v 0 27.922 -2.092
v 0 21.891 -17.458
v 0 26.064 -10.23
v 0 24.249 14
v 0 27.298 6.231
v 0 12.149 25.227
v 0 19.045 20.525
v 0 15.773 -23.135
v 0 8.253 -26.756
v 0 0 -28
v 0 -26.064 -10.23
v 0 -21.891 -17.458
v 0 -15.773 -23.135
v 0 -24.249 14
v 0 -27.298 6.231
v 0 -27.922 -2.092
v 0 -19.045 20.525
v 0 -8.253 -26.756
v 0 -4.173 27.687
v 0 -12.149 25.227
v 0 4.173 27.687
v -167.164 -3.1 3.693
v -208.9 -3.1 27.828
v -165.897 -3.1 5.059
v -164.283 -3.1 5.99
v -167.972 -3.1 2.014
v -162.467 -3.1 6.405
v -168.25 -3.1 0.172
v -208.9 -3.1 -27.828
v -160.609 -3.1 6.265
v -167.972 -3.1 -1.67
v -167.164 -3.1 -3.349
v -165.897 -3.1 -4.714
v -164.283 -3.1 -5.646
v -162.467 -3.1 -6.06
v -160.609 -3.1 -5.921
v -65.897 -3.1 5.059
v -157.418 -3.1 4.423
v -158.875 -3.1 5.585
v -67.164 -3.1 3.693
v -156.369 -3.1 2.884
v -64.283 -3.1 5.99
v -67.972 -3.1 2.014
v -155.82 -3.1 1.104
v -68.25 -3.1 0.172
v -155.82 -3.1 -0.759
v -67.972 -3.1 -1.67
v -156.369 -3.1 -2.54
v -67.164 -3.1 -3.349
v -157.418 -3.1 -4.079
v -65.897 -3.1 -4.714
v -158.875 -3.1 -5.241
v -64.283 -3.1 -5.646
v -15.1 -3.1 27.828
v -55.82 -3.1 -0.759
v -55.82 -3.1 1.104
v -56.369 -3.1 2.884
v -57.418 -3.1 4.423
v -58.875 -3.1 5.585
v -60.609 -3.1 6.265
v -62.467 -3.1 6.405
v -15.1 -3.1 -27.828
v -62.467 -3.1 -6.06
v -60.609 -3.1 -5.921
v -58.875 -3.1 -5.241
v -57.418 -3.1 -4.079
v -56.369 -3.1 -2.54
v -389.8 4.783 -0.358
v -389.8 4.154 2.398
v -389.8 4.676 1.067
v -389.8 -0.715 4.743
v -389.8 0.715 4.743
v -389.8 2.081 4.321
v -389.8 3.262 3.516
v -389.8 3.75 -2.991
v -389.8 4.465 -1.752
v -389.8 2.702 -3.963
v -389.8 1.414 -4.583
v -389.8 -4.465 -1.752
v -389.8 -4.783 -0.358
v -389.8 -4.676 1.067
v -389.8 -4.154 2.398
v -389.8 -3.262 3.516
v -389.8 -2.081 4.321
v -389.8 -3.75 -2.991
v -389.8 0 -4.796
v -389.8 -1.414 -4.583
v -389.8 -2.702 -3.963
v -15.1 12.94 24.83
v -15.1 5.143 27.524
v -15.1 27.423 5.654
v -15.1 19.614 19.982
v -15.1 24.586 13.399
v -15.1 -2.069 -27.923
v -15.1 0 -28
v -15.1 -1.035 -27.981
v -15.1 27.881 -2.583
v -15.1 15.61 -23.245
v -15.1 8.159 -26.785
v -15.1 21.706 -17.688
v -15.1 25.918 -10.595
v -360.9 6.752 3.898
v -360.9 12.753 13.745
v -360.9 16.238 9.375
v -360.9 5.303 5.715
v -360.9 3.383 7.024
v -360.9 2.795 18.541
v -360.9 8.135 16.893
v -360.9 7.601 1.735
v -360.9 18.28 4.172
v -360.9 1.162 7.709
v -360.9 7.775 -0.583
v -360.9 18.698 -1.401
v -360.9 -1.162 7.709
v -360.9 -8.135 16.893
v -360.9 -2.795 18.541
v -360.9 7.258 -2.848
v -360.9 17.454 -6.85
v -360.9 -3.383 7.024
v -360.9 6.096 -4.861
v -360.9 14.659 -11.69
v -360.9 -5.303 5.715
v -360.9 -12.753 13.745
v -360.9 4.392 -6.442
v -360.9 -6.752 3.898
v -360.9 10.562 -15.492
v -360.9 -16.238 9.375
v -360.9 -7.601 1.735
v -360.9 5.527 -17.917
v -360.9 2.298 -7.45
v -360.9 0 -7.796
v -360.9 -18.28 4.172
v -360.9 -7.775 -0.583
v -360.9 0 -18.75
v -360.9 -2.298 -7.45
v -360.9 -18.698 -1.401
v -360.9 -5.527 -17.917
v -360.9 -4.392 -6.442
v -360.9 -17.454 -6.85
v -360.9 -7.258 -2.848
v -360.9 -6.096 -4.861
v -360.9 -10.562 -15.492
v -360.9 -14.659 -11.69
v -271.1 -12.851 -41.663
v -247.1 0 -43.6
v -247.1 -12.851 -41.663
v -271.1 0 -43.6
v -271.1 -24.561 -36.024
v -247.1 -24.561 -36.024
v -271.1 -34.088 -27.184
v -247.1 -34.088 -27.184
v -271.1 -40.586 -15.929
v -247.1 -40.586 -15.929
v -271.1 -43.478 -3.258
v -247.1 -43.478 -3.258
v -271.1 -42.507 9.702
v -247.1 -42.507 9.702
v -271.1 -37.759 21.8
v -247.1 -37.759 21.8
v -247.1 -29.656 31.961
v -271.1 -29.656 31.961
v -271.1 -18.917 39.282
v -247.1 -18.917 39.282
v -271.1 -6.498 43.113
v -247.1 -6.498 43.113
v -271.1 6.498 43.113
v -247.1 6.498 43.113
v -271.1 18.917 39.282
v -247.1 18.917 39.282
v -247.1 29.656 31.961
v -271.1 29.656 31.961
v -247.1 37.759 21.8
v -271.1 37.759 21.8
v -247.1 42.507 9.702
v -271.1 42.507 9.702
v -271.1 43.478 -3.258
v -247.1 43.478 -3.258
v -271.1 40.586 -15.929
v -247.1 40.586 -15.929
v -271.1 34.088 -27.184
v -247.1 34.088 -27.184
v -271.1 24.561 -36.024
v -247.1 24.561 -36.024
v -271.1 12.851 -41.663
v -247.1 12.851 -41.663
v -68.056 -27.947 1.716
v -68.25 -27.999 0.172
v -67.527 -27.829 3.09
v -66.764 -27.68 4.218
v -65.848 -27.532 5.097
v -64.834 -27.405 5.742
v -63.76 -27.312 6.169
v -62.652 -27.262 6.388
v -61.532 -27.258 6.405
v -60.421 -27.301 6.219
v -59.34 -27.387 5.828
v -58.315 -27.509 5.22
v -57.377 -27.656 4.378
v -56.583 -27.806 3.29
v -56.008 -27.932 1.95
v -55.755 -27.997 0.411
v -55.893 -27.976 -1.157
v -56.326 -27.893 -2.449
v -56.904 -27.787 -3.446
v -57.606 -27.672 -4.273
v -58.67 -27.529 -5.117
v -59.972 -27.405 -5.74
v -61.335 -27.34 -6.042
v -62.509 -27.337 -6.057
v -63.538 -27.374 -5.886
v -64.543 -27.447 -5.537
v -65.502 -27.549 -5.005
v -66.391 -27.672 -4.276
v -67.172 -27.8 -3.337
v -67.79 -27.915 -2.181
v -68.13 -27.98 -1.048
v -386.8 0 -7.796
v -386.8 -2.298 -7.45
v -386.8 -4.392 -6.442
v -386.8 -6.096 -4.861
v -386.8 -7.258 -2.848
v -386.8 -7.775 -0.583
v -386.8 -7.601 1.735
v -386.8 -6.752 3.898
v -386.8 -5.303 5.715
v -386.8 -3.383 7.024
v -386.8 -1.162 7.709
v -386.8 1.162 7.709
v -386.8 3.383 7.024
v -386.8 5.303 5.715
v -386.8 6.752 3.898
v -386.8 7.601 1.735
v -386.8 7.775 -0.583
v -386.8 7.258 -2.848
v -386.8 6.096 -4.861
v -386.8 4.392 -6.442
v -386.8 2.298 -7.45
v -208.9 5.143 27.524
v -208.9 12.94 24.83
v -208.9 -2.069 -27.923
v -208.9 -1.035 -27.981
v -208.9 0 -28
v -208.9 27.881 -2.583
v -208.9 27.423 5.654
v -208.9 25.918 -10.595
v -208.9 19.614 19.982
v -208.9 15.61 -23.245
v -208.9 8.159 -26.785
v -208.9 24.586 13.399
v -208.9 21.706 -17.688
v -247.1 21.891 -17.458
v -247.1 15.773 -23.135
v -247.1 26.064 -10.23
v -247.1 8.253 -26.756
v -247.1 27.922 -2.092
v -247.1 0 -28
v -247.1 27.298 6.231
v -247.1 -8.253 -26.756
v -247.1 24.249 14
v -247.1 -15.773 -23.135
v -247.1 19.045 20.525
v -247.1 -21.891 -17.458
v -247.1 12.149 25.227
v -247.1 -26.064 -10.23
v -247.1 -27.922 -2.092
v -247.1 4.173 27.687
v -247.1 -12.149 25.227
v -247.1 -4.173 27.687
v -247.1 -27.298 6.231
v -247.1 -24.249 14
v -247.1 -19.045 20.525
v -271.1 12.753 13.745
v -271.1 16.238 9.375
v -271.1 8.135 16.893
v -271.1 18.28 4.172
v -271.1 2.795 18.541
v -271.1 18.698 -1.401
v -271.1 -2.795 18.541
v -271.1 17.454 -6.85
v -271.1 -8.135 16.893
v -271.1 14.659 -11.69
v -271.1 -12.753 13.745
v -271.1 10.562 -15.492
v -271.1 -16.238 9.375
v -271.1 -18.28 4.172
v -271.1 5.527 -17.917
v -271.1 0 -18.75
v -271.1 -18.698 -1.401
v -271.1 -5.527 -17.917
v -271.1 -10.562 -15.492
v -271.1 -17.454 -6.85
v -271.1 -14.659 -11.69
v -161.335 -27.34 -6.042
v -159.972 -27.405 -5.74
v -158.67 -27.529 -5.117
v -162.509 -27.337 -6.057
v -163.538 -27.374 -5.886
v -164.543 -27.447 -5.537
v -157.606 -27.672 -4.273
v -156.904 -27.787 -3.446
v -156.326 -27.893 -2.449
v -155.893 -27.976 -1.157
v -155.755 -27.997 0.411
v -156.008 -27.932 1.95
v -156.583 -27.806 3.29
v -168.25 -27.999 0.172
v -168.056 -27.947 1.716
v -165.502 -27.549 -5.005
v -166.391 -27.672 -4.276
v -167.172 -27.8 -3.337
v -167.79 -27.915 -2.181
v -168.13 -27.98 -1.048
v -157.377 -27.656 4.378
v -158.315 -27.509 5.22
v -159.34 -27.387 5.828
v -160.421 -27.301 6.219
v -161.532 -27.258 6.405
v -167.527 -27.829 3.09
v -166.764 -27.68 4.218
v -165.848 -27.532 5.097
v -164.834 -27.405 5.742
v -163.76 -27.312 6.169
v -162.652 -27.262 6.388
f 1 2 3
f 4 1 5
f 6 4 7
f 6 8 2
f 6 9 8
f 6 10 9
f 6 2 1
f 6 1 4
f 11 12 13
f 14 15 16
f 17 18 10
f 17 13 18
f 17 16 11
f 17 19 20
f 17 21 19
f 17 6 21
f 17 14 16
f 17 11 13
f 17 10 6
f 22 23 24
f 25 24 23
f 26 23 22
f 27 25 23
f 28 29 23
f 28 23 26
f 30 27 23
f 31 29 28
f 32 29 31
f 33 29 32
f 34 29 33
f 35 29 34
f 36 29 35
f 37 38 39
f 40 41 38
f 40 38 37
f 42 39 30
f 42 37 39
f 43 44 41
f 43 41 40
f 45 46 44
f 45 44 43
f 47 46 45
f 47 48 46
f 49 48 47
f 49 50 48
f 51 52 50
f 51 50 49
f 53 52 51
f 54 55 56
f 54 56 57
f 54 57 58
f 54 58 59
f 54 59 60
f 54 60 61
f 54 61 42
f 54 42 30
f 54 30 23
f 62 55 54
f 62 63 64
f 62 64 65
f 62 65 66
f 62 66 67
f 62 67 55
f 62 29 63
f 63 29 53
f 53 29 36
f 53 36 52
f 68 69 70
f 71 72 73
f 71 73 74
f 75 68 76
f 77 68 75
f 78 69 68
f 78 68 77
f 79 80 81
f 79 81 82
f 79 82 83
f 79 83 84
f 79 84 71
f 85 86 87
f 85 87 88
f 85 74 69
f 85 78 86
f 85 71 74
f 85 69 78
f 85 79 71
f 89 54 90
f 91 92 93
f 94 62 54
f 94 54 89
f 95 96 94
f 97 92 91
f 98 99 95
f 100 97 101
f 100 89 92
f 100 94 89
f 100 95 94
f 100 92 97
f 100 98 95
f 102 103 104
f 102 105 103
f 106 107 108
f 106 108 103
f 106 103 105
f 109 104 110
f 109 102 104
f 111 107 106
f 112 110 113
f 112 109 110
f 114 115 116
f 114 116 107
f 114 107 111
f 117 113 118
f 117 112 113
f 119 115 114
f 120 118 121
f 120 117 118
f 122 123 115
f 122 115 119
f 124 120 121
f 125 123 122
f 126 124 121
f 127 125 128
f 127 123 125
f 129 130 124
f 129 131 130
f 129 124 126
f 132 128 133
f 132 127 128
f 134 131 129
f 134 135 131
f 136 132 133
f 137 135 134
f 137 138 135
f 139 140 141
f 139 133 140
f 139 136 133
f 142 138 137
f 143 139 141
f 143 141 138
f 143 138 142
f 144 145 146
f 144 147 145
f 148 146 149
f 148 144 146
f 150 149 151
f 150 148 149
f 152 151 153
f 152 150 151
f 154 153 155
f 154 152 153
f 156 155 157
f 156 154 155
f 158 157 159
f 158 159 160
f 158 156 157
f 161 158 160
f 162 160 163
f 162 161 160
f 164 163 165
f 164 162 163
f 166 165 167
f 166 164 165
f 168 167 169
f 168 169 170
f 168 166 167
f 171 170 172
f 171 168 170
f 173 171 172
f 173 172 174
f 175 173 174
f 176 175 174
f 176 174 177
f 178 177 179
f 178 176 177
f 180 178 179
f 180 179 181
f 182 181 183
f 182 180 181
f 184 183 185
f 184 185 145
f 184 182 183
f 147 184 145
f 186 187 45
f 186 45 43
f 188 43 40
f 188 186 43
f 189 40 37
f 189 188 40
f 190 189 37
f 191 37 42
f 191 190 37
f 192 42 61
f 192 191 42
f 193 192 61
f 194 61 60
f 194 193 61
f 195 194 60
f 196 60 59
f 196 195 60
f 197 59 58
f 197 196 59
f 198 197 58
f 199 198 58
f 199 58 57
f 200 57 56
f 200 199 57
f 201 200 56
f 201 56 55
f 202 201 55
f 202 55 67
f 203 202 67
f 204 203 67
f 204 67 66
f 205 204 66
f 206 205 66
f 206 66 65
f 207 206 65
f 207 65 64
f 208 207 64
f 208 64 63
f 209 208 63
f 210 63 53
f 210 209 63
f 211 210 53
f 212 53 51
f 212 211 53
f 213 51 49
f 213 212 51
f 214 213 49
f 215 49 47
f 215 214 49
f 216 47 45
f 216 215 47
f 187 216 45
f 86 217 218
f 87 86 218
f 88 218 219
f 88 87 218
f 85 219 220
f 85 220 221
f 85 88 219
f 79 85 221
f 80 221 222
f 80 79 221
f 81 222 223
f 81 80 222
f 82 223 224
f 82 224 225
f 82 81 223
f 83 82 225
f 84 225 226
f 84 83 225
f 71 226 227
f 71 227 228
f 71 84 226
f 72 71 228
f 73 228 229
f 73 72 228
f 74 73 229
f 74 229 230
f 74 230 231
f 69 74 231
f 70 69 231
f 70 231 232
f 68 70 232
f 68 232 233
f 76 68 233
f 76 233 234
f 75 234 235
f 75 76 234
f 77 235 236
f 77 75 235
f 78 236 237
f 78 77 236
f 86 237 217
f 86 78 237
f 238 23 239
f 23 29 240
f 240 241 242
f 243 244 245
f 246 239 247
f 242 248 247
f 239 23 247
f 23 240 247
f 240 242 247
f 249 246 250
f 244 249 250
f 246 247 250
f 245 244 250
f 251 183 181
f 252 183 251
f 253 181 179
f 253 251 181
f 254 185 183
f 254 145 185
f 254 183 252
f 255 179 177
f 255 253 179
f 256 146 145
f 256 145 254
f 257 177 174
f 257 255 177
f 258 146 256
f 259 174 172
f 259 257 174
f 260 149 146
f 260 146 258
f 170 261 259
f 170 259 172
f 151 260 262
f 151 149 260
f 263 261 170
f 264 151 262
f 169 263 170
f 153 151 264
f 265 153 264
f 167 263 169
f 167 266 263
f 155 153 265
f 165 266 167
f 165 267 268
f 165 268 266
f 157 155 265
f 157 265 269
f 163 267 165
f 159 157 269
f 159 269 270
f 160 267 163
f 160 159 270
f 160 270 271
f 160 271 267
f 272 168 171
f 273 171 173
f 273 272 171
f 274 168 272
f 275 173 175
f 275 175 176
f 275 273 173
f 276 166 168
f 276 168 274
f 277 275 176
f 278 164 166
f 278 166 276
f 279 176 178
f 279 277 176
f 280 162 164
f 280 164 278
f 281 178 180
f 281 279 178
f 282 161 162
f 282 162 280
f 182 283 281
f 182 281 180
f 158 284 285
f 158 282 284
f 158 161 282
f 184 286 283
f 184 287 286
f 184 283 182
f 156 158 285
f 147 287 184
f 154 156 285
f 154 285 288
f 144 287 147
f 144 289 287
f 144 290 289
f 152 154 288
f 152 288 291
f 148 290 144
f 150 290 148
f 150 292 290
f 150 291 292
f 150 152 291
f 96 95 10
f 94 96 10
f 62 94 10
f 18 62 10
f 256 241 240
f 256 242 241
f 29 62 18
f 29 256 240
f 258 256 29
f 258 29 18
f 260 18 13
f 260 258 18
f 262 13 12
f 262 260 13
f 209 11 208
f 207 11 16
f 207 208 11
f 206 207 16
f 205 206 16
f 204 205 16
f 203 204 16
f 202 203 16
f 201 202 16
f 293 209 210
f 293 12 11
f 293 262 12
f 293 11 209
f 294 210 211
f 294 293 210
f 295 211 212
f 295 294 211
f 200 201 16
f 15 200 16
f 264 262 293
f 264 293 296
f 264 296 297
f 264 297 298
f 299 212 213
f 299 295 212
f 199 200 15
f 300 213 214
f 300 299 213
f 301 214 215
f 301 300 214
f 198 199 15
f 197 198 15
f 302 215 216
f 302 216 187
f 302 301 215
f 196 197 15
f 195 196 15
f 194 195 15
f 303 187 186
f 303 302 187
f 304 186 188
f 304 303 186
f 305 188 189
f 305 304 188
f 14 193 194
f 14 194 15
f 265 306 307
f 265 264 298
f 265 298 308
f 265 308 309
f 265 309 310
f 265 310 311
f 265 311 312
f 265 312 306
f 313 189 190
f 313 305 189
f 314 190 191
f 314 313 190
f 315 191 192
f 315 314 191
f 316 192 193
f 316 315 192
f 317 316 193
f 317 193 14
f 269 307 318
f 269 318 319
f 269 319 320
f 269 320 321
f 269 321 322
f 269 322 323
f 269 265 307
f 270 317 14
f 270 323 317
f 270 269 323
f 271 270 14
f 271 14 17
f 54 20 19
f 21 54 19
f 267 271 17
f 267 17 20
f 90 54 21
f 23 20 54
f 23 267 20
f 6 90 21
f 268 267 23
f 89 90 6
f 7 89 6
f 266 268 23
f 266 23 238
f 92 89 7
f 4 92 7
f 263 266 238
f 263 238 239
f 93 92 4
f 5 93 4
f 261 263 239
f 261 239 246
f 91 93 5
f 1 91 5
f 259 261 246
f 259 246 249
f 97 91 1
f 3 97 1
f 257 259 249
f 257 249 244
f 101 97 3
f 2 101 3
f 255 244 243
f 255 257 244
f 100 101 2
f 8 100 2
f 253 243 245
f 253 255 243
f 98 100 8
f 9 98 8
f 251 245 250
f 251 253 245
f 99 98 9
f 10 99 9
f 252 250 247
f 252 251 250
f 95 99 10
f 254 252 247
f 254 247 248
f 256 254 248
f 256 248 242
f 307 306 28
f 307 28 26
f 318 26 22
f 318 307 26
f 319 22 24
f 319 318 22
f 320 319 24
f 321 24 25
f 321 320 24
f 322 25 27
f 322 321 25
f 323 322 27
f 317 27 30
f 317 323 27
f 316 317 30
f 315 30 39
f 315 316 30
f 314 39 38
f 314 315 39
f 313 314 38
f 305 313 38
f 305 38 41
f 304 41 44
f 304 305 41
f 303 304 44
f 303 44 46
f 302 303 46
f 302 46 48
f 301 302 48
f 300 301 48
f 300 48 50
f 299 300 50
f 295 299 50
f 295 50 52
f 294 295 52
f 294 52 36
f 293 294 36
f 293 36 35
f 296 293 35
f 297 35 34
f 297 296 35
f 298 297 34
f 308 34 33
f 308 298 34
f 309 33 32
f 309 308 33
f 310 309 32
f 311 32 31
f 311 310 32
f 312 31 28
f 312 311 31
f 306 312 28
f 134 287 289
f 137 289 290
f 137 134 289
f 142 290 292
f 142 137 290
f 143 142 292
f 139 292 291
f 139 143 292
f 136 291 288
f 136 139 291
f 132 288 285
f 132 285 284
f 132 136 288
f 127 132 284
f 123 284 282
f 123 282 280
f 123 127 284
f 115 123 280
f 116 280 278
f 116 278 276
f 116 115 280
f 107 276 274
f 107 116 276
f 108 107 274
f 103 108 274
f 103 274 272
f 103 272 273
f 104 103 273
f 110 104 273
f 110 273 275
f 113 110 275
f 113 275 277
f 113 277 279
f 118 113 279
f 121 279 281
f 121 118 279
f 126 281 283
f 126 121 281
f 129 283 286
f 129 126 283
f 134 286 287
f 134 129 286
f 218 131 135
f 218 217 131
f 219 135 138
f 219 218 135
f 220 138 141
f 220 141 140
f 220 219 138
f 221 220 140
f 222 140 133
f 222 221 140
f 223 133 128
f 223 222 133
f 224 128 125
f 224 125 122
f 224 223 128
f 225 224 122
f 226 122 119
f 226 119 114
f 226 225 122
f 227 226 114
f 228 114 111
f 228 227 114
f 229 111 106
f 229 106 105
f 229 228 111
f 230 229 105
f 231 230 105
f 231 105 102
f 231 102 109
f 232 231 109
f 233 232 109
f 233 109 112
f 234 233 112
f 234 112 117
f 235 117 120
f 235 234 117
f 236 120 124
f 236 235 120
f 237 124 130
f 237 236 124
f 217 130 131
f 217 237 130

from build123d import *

# Parameters (mm, degrees)
CUT_EXTRUDE1_DEPTH      = 395.646626743
CUT_EXTRUDE1_DEPTH_BACK = 395.646626743
SKETCH2_W               = 193.8
SKETCH2_H               = 31.1
CUT_EXTRUDE2_DEPTH      = 396.001126581
CUT_EXTRUDE2_DEPTH_BACK = 396.001126581
SKETCH3_R               = 6.25


with BuildPart() as part:
    # Sketch1 → Revolve1 (revolve)
    with BuildSketch(Plane.XY, mode=Mode.PRIVATE) as revolve1_sk:
        Polygon((0, 0), (0, 28), (-247.1, 28), (-247.1, 43.6), (-271.1, 43.6), (-271.1, 18.75), (-360.9, 18.75), (-360.9, 7.796453039), (-386.8, 7.796453039), (-389.8, 4.796453039), (-389.8, 0), align=None)
    revolve(revolve1_sk.sketch.rotate(Axis((0, 0, 0), (-1, 0, 0)), 90), axis=Axis((0, 0, 0), (-1, 0, 0)))

    # Sketch2 → Cut-Extrude1 (cut, two sides: drawn at the far end of the back side and taken through both)
    with BuildSketch(Plane.XY.offset(-CUT_EXTRUDE1_DEPTH_BACK)):
        with Locations((-112, 12.45)):
            Rectangle(SKETCH2_W, SKETCH2_H)
    extrude(amount=CUT_EXTRUDE1_DEPTH + CUT_EXTRUDE1_DEPTH_BACK, mode=Mode.SUBTRACT)

    # Sketch3 → Cut-Extrude2 (cut, two sides: drawn at the far end of the back side and taken through both)
    with BuildSketch(Plane(origin=(0, -3.1, 0), x_dir=(1, 0, 0), z_dir=(0, 1, 0)).offset(-CUT_EXTRUDE2_DEPTH_BACK)):
        with Locations(Location((-162, -0.172136266, 0), (0, 0, 180))):
            Circle(SKETCH3_R)
        with Locations(Location((-62, -0.172136266, 0), (0, 0, 180))):
            Circle(SKETCH3_R)
    extrude(amount=CUT_EXTRUDE2_DEPTH + CUT_EXTRUDE2_DEPTH_BACK, mode=Mode.SUBTRACT)


solid = part.part
